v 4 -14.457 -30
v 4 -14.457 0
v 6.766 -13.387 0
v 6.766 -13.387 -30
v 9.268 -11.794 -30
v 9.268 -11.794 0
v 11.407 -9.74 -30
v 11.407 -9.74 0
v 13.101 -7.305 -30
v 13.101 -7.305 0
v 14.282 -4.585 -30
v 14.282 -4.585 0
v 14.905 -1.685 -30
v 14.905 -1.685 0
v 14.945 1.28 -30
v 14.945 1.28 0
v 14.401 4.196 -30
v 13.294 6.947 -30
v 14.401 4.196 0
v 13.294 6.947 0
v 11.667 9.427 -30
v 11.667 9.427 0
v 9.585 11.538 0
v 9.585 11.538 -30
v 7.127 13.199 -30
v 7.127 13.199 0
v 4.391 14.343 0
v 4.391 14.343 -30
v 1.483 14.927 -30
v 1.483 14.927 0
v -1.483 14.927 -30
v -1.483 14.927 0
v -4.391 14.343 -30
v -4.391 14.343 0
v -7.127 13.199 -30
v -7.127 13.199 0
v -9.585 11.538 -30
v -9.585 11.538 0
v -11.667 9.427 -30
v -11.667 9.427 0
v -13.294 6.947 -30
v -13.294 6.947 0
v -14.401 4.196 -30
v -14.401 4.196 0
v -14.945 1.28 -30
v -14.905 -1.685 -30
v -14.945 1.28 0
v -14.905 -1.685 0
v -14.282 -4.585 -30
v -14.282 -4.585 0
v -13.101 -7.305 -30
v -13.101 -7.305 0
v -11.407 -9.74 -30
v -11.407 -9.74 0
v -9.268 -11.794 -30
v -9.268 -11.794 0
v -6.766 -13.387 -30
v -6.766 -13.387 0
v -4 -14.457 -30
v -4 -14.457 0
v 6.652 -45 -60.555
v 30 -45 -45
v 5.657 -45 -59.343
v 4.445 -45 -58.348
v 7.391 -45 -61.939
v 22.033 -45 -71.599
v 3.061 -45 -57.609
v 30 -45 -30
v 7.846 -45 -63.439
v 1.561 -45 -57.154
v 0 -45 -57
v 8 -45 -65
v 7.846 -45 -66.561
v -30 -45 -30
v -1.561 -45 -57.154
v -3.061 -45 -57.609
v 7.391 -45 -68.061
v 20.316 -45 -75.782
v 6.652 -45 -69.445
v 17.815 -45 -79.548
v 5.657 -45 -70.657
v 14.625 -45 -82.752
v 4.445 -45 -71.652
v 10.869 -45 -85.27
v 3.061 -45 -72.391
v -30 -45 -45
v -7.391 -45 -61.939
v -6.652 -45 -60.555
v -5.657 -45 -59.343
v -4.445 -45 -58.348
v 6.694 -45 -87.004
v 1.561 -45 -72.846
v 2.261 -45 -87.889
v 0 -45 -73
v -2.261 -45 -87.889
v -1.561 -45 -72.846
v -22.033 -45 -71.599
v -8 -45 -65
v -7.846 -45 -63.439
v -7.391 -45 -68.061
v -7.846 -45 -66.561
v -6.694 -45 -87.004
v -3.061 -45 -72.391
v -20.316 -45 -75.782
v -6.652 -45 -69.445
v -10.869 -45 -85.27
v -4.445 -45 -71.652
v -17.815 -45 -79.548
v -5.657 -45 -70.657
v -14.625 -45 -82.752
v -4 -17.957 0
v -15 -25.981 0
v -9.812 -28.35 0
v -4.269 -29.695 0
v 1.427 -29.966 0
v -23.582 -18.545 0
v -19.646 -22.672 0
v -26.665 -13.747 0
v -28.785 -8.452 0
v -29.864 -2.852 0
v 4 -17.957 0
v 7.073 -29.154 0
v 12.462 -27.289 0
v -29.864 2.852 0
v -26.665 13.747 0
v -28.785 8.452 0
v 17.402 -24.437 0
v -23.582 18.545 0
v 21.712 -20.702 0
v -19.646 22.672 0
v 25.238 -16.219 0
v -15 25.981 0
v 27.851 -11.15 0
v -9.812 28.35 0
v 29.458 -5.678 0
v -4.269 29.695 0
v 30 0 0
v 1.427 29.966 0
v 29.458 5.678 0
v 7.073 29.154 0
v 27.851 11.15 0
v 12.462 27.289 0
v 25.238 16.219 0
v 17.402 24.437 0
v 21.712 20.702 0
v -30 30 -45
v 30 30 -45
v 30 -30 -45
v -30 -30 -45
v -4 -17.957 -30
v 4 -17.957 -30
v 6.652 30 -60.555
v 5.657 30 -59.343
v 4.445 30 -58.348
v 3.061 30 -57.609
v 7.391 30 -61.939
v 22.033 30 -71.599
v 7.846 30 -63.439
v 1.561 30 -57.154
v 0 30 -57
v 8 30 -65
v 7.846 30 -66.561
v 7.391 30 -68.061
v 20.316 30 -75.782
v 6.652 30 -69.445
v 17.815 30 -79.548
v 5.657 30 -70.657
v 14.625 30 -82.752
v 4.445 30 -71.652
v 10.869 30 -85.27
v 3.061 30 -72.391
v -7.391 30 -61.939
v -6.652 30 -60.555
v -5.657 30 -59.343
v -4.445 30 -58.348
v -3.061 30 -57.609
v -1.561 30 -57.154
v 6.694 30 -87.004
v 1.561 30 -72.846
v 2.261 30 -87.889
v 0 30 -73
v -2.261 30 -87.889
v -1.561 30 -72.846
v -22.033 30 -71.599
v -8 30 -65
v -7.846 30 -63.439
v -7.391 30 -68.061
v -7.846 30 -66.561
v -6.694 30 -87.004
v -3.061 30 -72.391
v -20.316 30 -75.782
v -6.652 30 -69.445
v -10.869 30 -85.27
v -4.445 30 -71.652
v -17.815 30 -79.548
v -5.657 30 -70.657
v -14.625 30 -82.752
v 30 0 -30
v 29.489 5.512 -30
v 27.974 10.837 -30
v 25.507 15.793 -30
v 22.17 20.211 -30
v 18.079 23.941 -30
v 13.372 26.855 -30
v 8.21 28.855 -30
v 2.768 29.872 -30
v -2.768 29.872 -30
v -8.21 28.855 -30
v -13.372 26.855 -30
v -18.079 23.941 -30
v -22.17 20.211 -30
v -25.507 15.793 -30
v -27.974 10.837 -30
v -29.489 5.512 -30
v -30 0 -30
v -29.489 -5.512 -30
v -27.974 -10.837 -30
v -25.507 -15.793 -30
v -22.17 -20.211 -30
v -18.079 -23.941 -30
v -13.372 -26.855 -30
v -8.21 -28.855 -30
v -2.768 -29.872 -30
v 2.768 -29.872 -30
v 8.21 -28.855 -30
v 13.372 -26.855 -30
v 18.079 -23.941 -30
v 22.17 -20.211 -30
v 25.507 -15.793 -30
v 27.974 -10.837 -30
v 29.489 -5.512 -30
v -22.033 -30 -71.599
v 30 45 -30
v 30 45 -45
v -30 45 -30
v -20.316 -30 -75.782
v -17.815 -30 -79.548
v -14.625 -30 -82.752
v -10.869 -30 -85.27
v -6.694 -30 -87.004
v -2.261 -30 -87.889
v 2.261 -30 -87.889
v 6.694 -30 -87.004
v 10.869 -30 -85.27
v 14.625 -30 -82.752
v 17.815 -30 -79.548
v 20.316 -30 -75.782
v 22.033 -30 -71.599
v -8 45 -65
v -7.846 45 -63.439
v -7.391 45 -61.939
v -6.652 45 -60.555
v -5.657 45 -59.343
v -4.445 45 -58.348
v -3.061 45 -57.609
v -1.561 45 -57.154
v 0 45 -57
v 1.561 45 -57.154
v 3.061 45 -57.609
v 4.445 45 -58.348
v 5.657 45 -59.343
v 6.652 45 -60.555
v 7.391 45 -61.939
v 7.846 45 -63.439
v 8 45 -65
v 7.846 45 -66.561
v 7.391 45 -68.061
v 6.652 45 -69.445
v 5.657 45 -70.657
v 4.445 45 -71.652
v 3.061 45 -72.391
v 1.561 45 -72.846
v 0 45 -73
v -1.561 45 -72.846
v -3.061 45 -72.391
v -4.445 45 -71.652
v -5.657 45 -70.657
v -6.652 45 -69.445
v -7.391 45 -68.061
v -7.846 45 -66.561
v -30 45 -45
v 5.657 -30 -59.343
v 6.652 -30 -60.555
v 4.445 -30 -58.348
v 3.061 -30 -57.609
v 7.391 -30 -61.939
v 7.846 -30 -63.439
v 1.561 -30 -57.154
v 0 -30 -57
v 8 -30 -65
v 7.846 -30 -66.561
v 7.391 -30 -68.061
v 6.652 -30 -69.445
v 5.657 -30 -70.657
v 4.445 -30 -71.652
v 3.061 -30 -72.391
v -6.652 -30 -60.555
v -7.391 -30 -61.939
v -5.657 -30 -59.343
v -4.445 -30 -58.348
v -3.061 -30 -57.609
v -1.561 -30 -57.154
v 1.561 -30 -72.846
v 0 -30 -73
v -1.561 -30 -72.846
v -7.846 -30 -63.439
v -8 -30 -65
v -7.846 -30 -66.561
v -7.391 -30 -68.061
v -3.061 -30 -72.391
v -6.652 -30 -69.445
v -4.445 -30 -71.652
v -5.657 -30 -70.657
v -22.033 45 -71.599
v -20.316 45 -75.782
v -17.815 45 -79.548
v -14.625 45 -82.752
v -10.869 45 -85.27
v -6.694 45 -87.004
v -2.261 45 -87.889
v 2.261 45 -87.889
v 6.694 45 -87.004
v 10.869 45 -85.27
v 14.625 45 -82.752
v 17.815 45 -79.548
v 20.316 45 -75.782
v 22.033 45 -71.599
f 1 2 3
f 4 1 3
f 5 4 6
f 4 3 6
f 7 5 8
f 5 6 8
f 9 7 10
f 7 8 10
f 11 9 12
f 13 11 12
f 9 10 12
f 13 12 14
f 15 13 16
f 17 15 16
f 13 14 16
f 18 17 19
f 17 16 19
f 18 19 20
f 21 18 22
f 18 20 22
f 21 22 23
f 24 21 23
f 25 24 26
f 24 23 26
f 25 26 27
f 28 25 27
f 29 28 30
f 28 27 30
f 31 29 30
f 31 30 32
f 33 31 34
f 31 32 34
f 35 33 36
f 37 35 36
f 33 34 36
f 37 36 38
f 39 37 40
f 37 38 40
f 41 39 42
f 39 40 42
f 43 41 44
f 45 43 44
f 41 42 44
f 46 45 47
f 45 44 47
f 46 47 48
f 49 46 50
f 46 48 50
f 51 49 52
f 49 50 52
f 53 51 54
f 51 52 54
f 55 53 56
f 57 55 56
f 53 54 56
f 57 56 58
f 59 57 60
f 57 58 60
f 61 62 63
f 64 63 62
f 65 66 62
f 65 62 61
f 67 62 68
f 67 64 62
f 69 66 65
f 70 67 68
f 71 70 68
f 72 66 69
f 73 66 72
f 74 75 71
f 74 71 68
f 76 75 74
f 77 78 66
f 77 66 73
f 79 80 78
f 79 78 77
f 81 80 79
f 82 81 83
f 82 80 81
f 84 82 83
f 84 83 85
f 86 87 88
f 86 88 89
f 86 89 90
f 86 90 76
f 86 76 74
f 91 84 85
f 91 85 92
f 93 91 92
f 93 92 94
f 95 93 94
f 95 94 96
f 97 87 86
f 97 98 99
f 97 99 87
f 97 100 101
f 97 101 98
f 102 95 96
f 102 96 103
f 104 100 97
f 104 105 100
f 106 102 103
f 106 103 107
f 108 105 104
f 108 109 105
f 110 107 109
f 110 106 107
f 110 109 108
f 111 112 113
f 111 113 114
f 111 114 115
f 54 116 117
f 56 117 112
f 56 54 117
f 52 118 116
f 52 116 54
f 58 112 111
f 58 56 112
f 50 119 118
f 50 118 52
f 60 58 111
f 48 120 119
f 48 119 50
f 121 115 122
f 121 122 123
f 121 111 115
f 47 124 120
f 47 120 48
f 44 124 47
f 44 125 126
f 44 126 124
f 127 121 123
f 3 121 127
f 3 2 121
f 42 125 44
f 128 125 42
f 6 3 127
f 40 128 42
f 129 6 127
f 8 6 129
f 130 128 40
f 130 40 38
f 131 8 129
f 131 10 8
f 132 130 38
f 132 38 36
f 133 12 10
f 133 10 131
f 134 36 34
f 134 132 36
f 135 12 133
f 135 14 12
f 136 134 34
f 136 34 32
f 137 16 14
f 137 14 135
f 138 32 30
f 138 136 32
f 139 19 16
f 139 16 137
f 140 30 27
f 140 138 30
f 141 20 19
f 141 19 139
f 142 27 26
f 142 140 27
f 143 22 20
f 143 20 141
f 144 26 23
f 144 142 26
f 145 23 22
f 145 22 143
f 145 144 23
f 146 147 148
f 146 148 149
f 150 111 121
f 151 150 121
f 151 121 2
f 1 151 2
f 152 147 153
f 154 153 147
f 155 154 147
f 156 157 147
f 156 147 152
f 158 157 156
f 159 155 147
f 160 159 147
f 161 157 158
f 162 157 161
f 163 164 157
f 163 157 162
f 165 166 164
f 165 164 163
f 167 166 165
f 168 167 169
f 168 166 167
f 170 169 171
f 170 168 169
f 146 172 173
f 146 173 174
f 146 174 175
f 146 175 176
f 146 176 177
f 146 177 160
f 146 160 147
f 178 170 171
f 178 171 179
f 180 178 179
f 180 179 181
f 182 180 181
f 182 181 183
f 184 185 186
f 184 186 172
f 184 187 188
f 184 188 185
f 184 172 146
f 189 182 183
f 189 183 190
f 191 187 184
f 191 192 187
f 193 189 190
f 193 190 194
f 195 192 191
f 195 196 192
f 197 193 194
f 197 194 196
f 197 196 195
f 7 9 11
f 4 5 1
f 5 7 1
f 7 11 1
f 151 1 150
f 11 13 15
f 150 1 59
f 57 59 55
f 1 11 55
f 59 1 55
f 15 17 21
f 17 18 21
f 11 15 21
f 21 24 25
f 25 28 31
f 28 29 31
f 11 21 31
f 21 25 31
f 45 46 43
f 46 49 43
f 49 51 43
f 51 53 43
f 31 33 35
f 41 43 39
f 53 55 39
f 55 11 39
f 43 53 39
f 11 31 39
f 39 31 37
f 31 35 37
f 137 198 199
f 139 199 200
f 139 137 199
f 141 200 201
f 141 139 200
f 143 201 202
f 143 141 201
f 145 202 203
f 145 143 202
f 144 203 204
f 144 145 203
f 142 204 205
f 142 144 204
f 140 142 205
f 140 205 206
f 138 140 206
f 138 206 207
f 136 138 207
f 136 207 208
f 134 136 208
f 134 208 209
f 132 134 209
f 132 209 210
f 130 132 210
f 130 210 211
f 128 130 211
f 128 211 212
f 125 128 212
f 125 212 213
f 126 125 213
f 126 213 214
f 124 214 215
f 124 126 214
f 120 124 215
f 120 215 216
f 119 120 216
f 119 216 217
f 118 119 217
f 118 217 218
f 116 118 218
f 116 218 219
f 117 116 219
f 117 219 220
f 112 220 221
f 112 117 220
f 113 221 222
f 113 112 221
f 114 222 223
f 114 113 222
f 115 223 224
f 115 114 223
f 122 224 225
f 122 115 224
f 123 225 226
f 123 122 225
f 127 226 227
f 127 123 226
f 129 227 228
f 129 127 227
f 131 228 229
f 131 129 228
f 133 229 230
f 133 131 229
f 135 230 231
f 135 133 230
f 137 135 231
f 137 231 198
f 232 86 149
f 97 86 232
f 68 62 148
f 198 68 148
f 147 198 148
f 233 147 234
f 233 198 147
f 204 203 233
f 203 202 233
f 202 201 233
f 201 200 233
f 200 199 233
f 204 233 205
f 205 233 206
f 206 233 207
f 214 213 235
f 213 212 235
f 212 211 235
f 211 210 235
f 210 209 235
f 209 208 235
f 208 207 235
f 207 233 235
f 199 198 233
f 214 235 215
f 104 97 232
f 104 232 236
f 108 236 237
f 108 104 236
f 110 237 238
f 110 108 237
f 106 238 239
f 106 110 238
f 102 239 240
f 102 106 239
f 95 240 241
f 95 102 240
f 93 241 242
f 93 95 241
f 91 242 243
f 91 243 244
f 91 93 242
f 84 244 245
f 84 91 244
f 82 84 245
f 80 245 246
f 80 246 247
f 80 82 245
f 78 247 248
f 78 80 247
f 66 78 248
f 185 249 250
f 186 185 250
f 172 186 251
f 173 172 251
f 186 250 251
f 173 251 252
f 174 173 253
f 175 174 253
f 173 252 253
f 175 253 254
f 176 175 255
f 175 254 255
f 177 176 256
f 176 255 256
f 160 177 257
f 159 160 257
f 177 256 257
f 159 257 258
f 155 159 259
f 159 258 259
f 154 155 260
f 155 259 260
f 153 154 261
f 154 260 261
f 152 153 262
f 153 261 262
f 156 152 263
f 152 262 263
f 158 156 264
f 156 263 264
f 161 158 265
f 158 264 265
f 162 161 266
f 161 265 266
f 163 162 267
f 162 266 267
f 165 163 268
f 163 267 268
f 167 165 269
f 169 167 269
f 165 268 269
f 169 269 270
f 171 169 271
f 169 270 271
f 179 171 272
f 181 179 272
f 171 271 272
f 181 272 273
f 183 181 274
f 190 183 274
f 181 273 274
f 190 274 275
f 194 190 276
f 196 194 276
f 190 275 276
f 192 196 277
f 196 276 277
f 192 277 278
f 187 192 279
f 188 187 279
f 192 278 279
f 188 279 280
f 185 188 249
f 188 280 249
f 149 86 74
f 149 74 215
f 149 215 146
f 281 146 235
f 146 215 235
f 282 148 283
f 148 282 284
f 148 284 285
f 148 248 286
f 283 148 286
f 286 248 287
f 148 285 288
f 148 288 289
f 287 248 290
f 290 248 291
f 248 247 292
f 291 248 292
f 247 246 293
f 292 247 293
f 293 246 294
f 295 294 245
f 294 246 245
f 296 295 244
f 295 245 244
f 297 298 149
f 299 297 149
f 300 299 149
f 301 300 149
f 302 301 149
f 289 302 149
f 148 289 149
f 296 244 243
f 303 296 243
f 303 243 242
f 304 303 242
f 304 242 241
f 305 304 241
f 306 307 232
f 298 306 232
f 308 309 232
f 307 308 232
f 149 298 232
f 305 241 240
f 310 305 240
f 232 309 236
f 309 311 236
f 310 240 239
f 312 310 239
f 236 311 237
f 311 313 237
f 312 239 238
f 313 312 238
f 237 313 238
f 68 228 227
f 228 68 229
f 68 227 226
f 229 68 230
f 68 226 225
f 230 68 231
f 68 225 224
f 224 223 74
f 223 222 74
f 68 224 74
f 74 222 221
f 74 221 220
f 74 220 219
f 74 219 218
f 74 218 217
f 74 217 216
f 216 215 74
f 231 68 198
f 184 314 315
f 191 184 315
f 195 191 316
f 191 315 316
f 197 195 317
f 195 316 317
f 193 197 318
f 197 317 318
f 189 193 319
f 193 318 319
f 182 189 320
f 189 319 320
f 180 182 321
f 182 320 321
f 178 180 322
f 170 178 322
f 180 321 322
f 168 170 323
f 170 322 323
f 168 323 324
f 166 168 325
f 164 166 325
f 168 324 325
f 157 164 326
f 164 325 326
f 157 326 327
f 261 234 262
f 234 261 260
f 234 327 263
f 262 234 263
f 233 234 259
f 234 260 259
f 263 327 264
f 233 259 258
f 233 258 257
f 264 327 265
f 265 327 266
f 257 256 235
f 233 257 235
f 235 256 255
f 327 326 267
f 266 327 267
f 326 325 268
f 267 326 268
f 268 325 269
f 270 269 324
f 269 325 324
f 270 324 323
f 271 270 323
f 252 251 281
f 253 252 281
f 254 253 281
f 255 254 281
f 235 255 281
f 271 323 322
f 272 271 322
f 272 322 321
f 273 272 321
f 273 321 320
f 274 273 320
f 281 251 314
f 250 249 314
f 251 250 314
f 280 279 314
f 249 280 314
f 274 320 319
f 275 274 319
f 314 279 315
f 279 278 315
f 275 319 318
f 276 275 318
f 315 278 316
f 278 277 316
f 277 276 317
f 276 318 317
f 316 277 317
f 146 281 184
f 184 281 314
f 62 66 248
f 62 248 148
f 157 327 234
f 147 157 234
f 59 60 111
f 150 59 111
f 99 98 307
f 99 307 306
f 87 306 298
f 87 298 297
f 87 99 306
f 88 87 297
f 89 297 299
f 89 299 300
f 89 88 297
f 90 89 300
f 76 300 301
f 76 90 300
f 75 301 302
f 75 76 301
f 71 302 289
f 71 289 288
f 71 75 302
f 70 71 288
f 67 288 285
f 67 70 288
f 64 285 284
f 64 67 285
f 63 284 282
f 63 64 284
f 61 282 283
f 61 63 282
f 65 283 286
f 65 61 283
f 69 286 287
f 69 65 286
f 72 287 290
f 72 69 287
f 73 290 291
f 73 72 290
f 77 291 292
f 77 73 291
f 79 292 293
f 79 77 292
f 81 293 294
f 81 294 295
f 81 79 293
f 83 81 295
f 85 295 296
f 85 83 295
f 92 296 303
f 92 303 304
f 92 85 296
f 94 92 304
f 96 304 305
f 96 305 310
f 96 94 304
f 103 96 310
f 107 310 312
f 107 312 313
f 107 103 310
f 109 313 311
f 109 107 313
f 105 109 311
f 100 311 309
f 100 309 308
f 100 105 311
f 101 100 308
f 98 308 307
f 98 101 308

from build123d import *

# Parameters (mm, degrees)
SKETCH1_R           = 30
BOSS_EXTRUDE1_DEPTH = 30
SKETCH2_W           = 60
SKETCH2_H           = 90
BOSS_EXTRUDE2_DEPTH = 15
SKETCH3_R           = 8
BOSS_EXTRUDE3_DEPTH = 15


with BuildPart() as part:
    # Sketch1 → Boss-Extrude1 (new body)
    with BuildSketch(Plane.XY):
        Circle(SKETCH1_R)
        with BuildLine():
            Line((-4, -14.456832295), (-4, -17.956832295))
            Line((-4, -17.956832295), (4, -17.956832295))
            Line((4, -17.956832295), (4, -14.456832295))
            ThreePointArc((4, -14.456832295), (0, 15), (-4, -14.456832295))
        make_face(mode=Mode.SUBTRACT)
    extrude(amount=-BOSS_EXTRUDE1_DEPTH)

    # Sketch2 → Boss-Extrude2 (add)
    with BuildSketch(Plane(origin=(0, 0, -30), x_dir=(-1, 0, 0), z_dir=(0, 0, -1))):
        Rectangle(SKETCH2_W, SKETCH2_H)
    extrude(amount=BOSS_EXTRUDE2_DEPTH)

    # Sketch3 → Boss-Extrude3 (add)
    with BuildSketch(Plane(origin=(0, 45, 0), x_dir=(1, 0, 0), z_dir=(0, 1, 0))):
        with BuildLine():
            Line((22.03289839, 71.599347585), (30, 45))
            Line((30, 45), (30, 30))
            Line((30, 30), (-30, 30))
            Line((-30, 30), (-30, 45))
            Line((-30, 45), (-22.03289839, 71.599347585))
            ThreePointArc((-22.03289839, 71.599347585), (0, 88), (22.03289839, 71.599347585))
        make_face()
        with Locations(Location((0, 65, 0), (0, 0, 180))):
            Circle(SKETCH3_R, mode=Mode.SUBTRACT)
    boss_extrude3 = extrude(amount=-BOSS_EXTRUDE3_DEPTH)

    # Mirror1: Boss-Extrude3 across plane
    add(boss_extrude3.mirror(Plane.ZX))


solid = part.part
